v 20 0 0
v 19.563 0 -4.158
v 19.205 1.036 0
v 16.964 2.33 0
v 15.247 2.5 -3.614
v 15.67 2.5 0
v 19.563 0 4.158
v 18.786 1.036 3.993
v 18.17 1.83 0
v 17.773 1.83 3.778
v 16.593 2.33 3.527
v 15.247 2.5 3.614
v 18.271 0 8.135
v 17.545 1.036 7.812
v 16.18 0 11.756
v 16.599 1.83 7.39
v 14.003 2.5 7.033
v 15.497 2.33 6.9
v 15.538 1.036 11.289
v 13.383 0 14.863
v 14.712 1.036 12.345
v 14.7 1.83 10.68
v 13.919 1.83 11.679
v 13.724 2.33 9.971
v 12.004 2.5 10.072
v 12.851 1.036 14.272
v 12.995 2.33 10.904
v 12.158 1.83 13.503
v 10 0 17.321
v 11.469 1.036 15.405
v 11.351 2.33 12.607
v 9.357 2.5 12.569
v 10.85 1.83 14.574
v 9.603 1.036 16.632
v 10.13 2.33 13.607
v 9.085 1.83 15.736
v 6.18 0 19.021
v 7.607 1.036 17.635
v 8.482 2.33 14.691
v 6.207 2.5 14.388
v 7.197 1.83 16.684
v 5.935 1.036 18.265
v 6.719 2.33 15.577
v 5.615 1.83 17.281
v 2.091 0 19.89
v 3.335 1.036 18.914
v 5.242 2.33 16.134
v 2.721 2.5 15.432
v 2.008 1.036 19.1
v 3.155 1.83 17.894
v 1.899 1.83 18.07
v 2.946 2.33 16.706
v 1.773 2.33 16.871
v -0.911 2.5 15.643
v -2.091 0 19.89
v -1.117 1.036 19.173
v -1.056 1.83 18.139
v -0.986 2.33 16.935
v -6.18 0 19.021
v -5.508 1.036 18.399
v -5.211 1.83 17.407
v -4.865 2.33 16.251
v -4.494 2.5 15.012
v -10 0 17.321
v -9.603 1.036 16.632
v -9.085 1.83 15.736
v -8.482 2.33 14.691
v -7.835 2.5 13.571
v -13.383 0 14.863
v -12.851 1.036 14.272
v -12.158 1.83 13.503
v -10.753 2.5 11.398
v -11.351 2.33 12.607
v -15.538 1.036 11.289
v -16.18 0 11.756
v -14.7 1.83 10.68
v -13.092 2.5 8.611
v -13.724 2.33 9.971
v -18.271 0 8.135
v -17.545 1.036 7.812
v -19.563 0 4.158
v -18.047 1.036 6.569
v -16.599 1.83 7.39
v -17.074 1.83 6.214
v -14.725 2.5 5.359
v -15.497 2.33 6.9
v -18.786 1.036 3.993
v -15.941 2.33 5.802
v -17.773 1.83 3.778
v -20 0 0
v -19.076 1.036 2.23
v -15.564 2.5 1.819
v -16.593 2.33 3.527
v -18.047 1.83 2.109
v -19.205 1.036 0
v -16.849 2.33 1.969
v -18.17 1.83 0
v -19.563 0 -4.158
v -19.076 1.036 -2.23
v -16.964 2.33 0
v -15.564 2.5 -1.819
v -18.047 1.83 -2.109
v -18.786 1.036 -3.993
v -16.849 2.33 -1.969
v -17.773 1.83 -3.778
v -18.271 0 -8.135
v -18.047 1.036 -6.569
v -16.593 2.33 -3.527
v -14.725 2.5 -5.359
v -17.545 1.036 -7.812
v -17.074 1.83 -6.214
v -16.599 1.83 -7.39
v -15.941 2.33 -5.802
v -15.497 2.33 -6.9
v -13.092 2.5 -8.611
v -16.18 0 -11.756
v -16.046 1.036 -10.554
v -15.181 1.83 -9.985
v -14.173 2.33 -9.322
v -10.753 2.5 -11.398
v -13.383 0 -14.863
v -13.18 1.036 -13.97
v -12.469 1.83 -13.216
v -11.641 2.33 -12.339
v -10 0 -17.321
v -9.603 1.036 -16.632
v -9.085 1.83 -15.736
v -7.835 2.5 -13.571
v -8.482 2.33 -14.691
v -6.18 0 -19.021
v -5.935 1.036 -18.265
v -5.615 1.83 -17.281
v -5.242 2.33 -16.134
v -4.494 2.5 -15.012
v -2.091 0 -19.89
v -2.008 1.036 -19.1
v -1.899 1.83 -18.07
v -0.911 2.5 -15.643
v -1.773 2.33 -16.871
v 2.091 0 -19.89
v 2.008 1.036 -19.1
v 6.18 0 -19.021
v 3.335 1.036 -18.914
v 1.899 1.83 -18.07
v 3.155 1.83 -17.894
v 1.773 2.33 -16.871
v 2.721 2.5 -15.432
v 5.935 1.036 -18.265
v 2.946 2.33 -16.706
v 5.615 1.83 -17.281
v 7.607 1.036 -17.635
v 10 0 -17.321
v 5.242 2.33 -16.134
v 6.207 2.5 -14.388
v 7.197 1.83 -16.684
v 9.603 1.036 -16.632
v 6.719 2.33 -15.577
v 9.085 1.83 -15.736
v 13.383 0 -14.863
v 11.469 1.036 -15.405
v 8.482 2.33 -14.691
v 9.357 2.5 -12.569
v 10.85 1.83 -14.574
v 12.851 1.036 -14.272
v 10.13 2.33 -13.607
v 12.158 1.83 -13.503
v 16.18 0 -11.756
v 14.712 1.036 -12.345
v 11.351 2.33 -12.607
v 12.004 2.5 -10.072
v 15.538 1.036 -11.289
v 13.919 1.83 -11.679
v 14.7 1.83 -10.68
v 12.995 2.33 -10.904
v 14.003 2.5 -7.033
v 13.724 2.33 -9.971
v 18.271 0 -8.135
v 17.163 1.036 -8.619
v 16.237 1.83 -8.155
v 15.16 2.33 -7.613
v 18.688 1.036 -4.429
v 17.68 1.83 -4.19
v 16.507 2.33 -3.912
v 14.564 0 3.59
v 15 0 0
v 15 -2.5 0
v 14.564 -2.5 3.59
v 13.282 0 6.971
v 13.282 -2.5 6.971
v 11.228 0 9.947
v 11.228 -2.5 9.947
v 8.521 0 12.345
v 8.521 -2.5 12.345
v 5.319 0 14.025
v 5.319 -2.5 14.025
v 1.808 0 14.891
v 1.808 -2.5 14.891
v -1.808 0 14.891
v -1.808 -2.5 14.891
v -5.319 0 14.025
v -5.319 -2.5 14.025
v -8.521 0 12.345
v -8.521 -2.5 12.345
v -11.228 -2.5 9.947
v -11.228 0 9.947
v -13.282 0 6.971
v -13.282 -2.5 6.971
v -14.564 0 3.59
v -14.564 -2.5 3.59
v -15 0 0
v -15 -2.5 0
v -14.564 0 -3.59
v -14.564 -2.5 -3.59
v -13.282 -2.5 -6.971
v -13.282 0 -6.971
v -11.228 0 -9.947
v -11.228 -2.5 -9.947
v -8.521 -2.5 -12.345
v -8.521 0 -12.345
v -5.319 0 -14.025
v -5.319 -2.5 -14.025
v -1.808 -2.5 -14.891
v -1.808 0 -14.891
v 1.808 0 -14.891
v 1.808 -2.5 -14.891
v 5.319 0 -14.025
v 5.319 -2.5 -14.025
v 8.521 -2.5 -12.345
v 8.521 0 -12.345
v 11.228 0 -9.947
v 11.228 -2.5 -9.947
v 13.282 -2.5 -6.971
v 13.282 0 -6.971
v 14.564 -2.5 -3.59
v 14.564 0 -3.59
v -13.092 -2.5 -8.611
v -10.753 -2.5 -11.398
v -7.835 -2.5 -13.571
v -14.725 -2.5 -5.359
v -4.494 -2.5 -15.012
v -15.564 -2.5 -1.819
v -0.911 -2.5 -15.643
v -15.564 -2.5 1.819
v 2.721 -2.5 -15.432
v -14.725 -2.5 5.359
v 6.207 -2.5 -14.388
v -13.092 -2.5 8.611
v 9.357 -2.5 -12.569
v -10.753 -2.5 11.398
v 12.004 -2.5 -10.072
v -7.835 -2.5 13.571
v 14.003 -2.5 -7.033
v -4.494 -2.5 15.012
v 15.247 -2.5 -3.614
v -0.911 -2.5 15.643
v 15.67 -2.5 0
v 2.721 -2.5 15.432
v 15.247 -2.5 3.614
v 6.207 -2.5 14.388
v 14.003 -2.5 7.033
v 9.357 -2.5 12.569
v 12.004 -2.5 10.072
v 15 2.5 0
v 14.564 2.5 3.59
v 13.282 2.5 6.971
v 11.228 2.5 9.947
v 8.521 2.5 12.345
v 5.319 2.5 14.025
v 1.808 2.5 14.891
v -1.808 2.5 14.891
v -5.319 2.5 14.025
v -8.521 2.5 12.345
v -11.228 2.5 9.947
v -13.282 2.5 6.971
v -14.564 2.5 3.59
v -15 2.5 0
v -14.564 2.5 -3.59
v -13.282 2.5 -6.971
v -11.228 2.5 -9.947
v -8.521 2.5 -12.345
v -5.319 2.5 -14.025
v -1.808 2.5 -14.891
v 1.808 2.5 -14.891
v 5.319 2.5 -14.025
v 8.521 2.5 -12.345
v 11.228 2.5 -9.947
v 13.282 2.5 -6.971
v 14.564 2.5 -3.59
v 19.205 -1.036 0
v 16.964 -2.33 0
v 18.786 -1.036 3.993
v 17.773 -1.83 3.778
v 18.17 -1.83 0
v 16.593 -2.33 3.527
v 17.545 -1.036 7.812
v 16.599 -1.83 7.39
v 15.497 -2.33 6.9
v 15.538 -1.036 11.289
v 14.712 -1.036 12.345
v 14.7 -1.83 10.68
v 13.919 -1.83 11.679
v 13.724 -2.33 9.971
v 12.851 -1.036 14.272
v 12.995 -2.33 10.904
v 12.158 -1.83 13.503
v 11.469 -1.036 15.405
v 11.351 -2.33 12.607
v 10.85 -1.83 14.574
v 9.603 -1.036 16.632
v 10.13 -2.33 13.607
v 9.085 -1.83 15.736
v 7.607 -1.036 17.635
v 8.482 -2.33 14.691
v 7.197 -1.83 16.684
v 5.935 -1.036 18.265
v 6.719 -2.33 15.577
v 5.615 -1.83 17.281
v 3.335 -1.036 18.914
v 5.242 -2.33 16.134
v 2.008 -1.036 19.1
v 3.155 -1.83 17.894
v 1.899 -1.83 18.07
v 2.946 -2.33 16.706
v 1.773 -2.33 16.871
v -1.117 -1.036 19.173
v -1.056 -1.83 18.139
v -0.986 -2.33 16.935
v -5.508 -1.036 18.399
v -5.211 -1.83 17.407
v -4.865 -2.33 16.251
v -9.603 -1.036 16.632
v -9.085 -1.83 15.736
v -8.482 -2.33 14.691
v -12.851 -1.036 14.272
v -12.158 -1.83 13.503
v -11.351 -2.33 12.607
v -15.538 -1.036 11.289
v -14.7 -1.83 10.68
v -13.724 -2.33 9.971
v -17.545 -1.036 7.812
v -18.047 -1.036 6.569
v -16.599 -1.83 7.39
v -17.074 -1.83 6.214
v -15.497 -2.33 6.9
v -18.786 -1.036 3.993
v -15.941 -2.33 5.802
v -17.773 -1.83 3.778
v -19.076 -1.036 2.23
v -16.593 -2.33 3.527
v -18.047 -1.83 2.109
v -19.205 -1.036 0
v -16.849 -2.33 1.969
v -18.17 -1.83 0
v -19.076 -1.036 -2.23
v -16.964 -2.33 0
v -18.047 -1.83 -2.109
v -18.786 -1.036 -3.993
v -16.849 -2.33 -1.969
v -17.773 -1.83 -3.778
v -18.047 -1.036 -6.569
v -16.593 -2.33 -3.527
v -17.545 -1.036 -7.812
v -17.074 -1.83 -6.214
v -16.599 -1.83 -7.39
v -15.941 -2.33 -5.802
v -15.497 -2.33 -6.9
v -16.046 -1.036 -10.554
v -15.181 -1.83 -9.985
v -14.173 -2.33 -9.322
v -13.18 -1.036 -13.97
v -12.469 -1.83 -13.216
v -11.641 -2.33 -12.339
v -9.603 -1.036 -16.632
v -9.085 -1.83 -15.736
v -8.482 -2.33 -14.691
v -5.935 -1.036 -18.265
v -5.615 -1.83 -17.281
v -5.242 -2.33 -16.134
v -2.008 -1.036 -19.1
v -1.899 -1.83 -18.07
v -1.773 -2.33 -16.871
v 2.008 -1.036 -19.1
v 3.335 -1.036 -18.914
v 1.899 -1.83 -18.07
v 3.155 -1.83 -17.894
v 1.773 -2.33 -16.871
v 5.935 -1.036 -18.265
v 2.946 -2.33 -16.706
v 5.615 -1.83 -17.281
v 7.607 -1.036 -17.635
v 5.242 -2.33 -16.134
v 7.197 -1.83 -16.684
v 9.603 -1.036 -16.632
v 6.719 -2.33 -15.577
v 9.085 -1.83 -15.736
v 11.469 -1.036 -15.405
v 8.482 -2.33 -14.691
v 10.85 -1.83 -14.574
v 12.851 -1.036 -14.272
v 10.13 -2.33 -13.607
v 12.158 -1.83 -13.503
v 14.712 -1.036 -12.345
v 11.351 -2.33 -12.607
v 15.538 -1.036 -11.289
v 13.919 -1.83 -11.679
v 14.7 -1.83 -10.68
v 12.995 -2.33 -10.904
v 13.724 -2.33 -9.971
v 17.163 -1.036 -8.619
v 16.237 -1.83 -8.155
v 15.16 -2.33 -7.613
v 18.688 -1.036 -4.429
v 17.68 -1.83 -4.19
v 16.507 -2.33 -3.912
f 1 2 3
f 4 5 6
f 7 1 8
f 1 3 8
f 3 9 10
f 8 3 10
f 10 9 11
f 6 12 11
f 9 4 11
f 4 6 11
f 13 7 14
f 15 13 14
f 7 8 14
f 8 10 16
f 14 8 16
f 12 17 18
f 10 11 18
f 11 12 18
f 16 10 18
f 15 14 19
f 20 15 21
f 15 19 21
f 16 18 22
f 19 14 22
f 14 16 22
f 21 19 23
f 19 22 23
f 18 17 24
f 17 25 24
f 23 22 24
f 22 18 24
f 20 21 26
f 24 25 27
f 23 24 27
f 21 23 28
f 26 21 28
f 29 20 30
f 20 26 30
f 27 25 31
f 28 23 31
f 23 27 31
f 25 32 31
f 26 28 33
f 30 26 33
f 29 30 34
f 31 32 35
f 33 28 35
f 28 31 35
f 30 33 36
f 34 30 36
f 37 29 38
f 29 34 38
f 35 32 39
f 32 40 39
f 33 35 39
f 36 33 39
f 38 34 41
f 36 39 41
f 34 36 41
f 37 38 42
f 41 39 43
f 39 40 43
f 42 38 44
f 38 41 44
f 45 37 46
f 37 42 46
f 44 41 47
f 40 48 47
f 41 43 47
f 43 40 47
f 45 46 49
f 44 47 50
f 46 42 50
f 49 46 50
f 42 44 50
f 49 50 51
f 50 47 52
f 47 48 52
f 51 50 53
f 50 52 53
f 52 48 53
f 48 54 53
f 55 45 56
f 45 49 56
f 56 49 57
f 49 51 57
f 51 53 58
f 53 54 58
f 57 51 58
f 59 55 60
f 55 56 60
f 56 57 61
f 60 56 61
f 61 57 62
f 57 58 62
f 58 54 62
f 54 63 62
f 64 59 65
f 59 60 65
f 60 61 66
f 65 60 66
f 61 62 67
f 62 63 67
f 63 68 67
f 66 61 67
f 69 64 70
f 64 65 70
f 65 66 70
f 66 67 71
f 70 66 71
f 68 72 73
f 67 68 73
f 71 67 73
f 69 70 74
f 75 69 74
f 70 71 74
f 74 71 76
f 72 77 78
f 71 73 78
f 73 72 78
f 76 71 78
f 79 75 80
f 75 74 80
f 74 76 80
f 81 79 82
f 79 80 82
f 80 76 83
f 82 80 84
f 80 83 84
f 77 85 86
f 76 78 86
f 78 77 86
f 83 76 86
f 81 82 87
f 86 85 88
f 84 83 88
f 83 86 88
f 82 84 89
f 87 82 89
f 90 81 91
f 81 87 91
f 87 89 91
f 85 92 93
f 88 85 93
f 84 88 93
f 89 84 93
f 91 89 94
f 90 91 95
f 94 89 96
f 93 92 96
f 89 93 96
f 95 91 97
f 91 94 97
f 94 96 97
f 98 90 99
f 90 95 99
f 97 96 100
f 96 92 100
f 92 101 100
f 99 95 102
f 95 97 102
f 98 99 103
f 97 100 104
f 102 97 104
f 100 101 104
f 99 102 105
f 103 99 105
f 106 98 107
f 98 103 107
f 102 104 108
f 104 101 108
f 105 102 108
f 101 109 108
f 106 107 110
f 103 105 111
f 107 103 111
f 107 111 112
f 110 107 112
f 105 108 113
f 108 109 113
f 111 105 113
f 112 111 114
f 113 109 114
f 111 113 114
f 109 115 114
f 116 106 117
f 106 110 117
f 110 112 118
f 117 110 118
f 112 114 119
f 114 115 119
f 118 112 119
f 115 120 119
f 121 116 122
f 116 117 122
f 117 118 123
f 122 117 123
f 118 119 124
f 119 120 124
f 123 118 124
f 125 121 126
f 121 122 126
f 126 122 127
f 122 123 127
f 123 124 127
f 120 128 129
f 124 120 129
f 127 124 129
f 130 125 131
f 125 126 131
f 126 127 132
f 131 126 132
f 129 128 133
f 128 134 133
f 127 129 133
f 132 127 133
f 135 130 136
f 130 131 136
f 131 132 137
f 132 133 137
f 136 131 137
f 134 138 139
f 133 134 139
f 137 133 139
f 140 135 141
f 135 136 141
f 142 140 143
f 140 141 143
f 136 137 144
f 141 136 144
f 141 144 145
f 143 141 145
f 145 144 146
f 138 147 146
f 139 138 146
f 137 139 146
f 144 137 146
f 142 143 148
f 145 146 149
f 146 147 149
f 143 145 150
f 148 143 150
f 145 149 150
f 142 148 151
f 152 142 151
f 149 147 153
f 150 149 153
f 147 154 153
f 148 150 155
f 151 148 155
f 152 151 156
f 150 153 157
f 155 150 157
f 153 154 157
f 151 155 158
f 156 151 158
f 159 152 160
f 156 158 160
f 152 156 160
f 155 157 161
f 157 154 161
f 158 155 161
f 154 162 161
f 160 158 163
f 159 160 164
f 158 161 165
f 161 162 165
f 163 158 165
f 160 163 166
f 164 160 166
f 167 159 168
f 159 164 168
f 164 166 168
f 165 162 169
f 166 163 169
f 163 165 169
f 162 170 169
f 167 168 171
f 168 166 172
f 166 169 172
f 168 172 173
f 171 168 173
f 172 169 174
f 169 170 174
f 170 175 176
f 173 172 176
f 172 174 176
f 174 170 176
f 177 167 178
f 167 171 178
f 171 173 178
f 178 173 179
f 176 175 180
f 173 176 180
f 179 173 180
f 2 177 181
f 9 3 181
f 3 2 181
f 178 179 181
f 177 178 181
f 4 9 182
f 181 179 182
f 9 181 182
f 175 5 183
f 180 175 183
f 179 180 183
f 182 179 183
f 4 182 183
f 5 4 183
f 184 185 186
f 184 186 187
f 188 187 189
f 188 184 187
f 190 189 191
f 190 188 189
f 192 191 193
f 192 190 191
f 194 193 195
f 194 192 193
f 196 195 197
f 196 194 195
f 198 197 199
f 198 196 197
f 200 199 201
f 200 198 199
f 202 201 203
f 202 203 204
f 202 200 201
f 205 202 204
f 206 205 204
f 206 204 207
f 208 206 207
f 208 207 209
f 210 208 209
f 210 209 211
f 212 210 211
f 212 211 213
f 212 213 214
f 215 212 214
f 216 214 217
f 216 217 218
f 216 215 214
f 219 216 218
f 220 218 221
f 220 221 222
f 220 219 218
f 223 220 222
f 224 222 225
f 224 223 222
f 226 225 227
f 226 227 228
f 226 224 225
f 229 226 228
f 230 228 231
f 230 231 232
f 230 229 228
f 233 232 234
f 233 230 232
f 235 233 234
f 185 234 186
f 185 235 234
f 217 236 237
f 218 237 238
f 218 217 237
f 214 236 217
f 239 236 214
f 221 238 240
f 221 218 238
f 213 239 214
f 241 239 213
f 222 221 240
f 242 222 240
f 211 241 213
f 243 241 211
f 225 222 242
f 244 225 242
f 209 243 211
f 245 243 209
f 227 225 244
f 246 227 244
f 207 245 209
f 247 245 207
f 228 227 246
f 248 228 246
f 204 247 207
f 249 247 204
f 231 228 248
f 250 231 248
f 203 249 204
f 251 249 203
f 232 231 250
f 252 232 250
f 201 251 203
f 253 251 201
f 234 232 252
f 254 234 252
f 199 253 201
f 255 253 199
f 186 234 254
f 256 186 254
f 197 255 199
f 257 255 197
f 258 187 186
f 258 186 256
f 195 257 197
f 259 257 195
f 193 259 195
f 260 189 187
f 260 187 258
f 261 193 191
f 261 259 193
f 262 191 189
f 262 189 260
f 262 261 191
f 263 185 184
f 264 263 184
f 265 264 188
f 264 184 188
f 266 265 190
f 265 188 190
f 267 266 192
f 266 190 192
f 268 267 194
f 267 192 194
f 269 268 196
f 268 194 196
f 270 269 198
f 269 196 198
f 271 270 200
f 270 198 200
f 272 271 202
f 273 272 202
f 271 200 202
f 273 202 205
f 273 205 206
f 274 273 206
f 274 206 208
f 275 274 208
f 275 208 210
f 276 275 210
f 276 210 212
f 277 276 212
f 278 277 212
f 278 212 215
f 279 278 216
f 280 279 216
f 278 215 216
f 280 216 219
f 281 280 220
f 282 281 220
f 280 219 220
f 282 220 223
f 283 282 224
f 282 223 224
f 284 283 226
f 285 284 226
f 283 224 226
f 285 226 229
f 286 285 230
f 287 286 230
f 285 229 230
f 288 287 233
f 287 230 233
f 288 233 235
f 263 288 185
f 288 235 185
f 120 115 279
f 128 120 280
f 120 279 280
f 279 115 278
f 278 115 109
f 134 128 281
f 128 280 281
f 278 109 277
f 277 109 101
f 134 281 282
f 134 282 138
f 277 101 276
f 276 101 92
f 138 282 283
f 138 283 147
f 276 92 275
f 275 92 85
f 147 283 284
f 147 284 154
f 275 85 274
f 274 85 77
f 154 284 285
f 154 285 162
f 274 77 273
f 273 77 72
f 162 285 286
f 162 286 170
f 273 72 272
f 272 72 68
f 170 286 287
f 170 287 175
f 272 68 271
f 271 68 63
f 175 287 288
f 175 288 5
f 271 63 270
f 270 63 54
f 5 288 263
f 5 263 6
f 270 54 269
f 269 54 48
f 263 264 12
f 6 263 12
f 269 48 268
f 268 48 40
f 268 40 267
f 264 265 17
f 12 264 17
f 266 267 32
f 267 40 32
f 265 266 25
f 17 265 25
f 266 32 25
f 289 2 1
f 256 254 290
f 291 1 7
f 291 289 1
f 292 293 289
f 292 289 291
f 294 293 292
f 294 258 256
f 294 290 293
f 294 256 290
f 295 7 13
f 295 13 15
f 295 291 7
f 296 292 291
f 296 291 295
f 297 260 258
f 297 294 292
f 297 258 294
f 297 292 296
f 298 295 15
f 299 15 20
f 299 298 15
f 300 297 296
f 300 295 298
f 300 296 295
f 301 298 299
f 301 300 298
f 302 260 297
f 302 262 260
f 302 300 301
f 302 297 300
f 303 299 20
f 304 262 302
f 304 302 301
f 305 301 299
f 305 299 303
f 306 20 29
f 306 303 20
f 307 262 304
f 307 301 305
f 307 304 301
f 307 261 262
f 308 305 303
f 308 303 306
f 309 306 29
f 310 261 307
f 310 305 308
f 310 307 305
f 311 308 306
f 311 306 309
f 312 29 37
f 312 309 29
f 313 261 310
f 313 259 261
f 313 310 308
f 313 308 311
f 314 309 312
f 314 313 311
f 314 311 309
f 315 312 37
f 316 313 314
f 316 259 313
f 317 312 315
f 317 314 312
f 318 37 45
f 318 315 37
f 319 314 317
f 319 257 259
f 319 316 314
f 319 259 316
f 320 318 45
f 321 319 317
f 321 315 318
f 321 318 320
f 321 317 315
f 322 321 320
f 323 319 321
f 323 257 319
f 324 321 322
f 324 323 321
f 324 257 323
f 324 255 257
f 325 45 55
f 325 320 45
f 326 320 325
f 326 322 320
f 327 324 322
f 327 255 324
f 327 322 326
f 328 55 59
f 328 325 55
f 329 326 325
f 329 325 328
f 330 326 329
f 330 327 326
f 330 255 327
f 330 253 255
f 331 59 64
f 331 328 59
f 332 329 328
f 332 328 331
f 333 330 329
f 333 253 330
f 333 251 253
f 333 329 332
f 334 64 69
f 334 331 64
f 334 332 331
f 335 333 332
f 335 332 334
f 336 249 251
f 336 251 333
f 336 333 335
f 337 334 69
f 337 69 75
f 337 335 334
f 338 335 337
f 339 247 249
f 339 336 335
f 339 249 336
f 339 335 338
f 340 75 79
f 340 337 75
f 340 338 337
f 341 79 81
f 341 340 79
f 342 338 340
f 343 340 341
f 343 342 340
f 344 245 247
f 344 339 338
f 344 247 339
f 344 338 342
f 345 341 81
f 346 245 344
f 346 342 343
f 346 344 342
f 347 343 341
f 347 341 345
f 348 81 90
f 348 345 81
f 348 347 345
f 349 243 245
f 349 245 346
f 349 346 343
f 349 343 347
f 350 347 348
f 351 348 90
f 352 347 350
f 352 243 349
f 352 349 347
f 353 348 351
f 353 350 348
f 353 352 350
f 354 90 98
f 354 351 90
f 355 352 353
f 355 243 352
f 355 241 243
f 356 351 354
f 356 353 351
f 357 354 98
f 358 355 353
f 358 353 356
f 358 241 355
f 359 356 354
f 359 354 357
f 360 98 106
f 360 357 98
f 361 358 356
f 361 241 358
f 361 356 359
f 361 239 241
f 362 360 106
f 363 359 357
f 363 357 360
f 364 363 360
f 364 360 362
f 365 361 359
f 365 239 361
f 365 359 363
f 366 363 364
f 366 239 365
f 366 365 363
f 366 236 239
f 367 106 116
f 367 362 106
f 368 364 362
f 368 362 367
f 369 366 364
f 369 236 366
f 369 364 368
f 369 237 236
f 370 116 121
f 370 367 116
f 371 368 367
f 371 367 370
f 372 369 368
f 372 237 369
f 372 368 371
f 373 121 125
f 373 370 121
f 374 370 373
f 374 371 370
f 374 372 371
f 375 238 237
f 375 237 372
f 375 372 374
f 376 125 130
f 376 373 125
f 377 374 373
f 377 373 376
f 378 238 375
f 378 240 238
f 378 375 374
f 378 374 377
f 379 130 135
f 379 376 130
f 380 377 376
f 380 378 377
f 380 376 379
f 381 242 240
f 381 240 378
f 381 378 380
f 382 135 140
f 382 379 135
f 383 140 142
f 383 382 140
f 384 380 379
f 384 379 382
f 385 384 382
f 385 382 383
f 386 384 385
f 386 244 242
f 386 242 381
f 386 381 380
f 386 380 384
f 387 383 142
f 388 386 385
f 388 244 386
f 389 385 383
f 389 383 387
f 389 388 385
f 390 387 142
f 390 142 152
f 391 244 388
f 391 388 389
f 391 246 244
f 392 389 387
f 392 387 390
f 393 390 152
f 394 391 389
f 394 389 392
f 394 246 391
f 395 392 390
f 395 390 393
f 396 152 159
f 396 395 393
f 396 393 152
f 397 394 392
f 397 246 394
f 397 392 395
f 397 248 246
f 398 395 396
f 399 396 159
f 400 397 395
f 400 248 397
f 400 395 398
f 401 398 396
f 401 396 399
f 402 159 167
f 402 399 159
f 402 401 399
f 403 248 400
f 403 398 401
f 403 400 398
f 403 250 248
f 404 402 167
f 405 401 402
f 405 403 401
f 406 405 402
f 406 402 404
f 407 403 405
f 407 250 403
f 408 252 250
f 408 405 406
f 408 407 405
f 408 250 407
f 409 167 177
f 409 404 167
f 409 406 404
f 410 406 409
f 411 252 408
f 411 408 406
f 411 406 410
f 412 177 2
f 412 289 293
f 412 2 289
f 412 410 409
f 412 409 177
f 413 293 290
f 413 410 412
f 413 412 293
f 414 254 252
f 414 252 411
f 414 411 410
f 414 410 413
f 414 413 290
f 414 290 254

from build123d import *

# Parameters (mm, degrees)
F0_R     = 20
F0_R_2   = 15
F1_DEPTH = 2.5


# Not quite as in the source:
# - a fillet or chamfer that OpenCascade refuses, or shapes differently, is made with other operations: its cross-section is extruded or revolved along the edge and cut away or added


with BuildPart() as f1:
    # F0 (on Front) → F1 (new body)
    with BuildSketch(Plane.XZ):
        Circle(F0_R)
        Circle(F0_R_2, mode=Mode.SUBTRACT)
    extrude(amount=F1_DEPTH)

    # F2: fillet of radius 5 on 1 edges, made by hand

    # F2_s1 → F2_t2 (revolve, cut)
    with BuildSketch(Plane.XY):
        with BuildLine():
            ThreePointArc((20, 0), (18.1698729811, -1.8301270189), (15.6698729811, -2.5))
            Line((15.6698729811, -2.5), (20, -2.5))
            Line((20, -2.5), (20, 0))
        make_face()
    revolve(axis=Axis((0, -2.5, 0), (0, -1, 0)), mode=Mode.SUBTRACT)

    # F3: F1 across plane


with BuildPart() as f1_1:
    add(f1.part)
    add(f1.part.mirror(Plane.XZ))


solid = f1_1.part
